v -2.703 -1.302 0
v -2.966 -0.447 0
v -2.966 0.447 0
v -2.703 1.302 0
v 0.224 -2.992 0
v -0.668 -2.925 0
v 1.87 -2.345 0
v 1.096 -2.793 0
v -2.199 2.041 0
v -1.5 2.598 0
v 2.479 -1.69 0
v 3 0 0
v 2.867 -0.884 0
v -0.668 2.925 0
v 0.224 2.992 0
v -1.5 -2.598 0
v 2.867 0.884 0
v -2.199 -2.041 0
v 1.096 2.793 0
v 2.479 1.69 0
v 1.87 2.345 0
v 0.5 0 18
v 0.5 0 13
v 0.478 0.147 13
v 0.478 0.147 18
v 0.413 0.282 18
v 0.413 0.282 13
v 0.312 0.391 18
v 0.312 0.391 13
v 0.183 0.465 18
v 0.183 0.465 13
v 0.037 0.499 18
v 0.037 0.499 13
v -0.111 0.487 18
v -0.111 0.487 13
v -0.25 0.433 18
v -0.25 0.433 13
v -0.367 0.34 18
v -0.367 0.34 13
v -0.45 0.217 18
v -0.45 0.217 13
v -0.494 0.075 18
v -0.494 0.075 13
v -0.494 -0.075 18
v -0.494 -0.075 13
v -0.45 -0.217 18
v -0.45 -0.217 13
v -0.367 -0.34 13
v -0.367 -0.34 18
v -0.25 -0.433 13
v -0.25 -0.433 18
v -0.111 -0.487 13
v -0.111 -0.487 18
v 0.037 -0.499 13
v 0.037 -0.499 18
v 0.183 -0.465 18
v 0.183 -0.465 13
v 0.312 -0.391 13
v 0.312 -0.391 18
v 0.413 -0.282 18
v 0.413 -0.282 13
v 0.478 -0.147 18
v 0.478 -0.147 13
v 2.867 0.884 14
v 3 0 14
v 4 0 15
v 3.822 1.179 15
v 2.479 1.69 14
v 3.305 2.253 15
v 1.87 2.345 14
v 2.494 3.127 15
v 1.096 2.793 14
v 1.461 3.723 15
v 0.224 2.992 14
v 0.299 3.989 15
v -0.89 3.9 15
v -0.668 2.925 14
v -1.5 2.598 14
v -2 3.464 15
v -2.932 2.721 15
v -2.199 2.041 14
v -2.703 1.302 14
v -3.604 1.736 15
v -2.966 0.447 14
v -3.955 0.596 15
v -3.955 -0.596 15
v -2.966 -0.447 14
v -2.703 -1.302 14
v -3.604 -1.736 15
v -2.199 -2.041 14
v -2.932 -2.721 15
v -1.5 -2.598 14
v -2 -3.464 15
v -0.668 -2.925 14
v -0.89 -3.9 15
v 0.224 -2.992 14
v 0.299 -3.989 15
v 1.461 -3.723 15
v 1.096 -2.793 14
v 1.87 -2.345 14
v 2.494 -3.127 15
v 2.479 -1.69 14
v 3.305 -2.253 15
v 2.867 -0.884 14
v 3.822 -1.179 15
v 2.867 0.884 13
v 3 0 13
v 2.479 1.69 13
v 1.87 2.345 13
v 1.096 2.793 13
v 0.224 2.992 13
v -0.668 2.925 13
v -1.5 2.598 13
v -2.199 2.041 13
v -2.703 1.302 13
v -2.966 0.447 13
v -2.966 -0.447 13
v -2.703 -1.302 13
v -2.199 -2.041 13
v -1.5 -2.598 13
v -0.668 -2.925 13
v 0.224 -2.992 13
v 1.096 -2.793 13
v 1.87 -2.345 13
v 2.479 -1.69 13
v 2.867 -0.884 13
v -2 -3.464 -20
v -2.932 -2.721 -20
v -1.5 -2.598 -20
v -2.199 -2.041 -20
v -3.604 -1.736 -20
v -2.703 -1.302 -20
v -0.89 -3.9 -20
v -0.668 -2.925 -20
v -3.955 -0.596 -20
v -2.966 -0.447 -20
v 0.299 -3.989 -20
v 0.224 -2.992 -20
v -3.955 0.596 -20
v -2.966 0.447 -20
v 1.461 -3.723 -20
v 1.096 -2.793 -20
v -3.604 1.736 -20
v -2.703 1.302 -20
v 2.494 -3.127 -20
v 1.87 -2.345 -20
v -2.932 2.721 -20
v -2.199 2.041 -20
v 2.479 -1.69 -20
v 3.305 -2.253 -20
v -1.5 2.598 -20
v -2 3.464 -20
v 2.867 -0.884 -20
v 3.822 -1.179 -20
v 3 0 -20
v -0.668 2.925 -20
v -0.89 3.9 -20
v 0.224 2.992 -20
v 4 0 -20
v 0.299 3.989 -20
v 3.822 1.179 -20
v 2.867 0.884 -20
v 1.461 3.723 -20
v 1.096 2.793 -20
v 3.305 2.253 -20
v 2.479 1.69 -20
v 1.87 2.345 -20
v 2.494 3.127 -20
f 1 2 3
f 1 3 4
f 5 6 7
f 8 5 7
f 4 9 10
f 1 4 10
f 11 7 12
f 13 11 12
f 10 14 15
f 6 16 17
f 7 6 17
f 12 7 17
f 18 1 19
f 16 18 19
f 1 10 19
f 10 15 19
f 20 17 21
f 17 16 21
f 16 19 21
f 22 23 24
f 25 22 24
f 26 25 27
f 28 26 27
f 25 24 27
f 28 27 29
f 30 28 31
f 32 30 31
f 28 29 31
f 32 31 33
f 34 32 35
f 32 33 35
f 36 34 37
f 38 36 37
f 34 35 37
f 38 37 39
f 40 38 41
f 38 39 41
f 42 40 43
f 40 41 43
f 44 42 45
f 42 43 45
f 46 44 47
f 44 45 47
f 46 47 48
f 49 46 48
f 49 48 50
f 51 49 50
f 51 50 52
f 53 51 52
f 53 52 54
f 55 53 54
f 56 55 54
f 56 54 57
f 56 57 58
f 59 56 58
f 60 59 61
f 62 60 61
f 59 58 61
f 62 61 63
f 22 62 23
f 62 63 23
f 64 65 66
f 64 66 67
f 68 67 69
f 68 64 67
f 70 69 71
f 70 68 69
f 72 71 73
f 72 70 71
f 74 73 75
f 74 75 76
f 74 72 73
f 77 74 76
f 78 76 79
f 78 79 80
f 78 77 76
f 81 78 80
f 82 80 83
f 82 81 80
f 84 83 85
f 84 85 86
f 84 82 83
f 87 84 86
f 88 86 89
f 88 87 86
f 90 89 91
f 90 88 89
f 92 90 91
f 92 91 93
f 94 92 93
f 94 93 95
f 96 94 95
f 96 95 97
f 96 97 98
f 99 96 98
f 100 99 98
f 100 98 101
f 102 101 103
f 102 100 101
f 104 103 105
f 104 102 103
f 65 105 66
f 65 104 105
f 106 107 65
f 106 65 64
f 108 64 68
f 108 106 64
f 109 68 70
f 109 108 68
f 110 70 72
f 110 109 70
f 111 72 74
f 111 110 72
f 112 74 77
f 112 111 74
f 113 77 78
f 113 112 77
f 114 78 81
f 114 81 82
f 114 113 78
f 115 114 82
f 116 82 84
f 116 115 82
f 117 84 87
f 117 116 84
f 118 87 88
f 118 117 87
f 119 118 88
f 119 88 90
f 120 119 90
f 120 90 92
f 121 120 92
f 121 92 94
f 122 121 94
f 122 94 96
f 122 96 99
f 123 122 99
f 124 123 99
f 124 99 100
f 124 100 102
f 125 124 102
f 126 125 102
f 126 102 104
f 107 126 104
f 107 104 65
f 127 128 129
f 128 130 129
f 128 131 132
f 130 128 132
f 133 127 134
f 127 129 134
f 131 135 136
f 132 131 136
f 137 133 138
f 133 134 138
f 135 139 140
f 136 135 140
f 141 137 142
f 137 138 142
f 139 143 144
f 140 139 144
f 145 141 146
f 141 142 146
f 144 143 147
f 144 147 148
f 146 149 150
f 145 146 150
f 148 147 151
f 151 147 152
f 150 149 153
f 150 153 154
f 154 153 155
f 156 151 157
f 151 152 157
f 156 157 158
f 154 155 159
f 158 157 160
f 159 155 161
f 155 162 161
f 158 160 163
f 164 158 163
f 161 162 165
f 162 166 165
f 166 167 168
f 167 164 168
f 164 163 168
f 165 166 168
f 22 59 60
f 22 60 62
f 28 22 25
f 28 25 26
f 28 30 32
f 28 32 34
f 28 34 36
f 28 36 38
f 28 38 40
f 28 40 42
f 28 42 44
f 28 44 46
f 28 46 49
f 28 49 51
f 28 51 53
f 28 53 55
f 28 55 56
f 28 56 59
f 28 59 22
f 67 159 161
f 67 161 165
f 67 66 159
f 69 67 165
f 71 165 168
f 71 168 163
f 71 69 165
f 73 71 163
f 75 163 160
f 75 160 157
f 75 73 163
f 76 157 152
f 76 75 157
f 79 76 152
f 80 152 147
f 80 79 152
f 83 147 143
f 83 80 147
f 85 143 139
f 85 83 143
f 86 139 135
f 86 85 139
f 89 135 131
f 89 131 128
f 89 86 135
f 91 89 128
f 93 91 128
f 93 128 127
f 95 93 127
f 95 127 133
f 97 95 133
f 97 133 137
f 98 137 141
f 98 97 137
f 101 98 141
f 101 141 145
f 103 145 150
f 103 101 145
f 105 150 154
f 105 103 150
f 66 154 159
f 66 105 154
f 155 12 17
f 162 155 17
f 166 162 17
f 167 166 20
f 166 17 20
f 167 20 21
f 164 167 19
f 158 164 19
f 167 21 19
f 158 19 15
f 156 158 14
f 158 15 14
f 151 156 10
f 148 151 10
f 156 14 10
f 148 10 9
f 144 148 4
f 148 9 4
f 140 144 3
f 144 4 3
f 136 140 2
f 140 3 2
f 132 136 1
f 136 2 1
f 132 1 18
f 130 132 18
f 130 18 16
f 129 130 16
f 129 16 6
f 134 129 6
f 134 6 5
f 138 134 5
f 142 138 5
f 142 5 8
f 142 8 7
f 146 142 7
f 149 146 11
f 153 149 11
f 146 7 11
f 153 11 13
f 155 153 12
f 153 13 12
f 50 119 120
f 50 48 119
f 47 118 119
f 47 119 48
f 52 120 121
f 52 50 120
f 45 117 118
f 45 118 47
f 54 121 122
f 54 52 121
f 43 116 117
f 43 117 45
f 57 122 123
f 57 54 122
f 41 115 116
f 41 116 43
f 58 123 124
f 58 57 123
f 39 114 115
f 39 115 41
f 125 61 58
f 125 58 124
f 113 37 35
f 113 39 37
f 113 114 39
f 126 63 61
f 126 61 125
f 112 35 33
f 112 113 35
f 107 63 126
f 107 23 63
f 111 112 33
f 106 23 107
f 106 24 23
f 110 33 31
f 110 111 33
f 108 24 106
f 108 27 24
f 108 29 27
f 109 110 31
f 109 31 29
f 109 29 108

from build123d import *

# Parameters (mm, degrees)
F0_R     = 4
F0_R_2   = 3
F1_DEPTH = 20
F2_DEPTH = 15
F3_DEPTH = 13
F4_SIZE  = 0.99999
F5_R     = 0.5
F6_DEPTH = 5


# Not quite as in the source:
# - a fillet or chamfer is up to 0.001 mm smaller than in the source, because OpenCascade refuses the exact size


with BuildPart() as f1:
    # F0 (on Top) → F1 (new body)
    with BuildSketch(Plane.XY):
        Circle(F0_R)
        Circle(F0_R_2, mode=Mode.SUBTRACT)
    extrude(amount=-F1_DEPTH)

    # F0 (on Top) → F2 (join)
    with BuildSketch(Plane.XY):
        Circle(F0_R)
        Circle(F0_R_2, mode=Mode.SUBTRACT)
    extrude(amount=F2_DEPTH)

    # F0 (on Top) → F3 (join)
    with BuildSketch(Plane.XY):
        Circle(F0_R_2)
    extrude(amount=F3_DEPTH)

    # F4 (size 1 in the source; OpenCascade refuses exactly that, so slightly less here)
    f4_edges = [f1.edges().sort_by_distance(p)[0] for p in [
        (-3, 0, 15),
    ]]
    chamfer(f4_edges, length=F4_SIZE)

    # F5 (on face) → F6 (join)
    with BuildSketch(Plane.XY.offset(13)):
        Circle(F5_R)
    extrude(amount=F6_DEPTH)


solid = f1.part
